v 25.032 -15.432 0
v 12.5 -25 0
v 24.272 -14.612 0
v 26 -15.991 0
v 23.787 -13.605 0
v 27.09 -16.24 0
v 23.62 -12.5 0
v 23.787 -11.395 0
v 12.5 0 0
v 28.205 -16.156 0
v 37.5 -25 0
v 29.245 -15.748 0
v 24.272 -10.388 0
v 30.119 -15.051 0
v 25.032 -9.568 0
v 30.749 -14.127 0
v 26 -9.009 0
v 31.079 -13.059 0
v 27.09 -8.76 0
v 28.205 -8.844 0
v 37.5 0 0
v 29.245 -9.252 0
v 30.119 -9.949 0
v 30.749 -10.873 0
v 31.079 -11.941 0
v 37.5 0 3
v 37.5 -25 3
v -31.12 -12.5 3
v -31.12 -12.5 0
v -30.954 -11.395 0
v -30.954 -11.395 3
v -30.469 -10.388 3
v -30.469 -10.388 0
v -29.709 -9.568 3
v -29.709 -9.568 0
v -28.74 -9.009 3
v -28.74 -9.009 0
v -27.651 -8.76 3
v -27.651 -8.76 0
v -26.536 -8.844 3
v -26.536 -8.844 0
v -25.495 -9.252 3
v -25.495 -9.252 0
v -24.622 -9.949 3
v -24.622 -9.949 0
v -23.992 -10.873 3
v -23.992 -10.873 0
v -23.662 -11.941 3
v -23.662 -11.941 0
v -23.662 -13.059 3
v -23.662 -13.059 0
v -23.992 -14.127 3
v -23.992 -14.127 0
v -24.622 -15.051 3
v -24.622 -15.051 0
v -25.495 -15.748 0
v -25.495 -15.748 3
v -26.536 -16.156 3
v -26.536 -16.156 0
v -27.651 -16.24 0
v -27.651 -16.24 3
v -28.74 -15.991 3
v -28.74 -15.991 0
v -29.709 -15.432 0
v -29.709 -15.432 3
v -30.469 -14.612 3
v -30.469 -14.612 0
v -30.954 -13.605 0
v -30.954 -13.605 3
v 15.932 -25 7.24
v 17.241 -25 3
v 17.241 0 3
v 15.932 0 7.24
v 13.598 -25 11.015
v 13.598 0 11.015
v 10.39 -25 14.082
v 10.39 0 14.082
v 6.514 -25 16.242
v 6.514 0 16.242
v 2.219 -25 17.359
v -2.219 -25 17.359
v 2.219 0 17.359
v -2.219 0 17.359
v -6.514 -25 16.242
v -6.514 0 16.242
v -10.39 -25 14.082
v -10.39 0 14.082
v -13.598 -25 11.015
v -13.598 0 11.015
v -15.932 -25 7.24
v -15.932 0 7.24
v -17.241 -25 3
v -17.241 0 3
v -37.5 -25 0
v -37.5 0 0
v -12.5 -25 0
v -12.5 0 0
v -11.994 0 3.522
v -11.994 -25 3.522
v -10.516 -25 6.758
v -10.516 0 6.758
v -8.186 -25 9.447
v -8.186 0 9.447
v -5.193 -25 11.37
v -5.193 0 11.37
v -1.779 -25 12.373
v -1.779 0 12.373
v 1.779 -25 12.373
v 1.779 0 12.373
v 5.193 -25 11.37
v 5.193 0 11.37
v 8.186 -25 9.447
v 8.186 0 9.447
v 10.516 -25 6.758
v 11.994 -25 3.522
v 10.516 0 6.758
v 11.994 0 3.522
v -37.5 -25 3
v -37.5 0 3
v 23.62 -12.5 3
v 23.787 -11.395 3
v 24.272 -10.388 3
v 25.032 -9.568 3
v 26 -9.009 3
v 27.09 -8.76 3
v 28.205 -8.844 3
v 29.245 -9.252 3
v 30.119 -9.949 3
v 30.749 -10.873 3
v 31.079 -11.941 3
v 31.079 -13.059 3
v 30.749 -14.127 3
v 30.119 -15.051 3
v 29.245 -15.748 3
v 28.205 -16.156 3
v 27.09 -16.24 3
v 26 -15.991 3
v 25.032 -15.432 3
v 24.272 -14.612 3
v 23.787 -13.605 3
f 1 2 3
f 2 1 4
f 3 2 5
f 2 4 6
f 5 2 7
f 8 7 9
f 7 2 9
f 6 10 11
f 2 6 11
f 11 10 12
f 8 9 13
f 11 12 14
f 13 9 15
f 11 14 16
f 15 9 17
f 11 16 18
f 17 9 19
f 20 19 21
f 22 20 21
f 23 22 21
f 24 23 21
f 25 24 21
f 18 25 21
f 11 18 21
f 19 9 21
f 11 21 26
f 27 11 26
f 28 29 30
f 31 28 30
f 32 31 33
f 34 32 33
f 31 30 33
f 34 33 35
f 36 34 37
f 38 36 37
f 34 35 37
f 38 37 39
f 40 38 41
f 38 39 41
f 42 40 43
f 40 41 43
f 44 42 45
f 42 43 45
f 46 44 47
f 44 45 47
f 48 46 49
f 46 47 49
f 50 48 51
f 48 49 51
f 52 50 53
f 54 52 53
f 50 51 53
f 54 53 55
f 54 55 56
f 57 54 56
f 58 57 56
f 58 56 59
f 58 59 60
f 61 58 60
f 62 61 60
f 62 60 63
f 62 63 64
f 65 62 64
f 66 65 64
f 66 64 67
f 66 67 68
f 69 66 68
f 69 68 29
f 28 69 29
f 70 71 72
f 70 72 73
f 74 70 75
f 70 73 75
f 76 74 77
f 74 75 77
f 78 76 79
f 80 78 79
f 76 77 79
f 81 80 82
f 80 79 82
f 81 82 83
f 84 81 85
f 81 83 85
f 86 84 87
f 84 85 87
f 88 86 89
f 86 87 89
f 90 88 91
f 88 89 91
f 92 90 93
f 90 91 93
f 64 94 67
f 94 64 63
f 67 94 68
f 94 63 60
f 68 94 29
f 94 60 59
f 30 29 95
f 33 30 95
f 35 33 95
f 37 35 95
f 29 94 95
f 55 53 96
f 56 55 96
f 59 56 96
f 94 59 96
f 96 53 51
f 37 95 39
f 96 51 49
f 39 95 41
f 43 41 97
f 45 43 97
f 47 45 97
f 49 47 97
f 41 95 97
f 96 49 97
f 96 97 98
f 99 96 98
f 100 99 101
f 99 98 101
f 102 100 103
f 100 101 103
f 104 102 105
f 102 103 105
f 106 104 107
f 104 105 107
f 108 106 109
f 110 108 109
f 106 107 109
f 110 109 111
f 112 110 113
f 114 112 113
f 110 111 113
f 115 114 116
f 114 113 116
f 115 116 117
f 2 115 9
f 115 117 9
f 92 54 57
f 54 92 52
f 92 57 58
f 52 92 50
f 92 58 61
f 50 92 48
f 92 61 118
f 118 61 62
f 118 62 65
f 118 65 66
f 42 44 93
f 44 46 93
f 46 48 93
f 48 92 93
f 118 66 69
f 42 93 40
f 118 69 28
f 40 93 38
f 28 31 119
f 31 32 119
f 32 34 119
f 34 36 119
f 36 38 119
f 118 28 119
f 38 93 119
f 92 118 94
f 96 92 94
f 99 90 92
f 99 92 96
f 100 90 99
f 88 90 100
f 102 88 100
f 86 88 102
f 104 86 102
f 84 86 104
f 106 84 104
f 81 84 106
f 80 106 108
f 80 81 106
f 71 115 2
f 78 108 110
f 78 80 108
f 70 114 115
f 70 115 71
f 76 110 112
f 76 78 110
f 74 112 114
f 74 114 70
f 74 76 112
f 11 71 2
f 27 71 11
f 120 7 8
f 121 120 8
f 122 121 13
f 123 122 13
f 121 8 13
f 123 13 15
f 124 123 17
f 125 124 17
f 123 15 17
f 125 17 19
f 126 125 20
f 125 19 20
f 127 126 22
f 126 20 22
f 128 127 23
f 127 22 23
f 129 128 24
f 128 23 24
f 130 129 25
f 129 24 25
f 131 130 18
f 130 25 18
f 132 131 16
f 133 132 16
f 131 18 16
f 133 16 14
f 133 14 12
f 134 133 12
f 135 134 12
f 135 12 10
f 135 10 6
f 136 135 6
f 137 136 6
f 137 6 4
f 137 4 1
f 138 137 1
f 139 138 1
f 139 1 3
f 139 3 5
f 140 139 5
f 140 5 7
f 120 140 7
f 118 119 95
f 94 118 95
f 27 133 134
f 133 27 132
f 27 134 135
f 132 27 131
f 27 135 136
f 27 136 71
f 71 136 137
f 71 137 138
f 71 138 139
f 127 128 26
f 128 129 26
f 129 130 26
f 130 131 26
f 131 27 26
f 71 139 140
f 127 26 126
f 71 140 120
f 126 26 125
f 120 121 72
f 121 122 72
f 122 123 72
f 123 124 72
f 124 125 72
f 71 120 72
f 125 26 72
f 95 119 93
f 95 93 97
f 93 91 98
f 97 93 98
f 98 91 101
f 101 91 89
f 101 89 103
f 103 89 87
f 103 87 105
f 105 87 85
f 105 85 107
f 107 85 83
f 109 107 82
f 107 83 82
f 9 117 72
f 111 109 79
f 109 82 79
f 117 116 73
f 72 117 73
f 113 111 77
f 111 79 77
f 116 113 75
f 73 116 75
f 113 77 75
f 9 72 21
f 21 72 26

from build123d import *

# Parameters (mm, degrees)
F1_DEPTH = 25
F3_D     = 7.5
F4_D     = 7.5


with BuildPart() as f1:
    # F0 (on Front) → F1 (new body)
    with BuildSketch(Plane.XZ):
        with BuildLine():
            ThreePointArc((-12.5, 0), (0, 12.5), (12.5, 0))
            Line((12.5, 0), (17.5, 0))
            Line((17.5, 0), (37.5, 0))
            Line((37.5, 0), (37.5, 3))
            Line((37.5, 3), (17.24094, 3))
            ThreePointArc((17.24094, 3), (0, 17.5), (-17.24094, 3))
            Line((-17.24094, 3), (-37.5, 3))
            Line((-37.5, 3), (-37.5, 0))
            Line((-37.5, 0), (-17.5, 0))
            Line((-17.5, 0), (-12.5, 0))
        make_face()
    extrude(amount=F1_DEPTH)

    # F3 (through all)
    with Locations(Plane.XY.offset(3)):
        with Locations((-27.37047, -12.5)):
            Hole(F3_D / 2)

    # F4 (through all)
    with Locations(Plane.XY.offset(3)):
        with Locations((27.37047, -12.5)):
            Hole(F4_D / 2)


solid = f1.part
